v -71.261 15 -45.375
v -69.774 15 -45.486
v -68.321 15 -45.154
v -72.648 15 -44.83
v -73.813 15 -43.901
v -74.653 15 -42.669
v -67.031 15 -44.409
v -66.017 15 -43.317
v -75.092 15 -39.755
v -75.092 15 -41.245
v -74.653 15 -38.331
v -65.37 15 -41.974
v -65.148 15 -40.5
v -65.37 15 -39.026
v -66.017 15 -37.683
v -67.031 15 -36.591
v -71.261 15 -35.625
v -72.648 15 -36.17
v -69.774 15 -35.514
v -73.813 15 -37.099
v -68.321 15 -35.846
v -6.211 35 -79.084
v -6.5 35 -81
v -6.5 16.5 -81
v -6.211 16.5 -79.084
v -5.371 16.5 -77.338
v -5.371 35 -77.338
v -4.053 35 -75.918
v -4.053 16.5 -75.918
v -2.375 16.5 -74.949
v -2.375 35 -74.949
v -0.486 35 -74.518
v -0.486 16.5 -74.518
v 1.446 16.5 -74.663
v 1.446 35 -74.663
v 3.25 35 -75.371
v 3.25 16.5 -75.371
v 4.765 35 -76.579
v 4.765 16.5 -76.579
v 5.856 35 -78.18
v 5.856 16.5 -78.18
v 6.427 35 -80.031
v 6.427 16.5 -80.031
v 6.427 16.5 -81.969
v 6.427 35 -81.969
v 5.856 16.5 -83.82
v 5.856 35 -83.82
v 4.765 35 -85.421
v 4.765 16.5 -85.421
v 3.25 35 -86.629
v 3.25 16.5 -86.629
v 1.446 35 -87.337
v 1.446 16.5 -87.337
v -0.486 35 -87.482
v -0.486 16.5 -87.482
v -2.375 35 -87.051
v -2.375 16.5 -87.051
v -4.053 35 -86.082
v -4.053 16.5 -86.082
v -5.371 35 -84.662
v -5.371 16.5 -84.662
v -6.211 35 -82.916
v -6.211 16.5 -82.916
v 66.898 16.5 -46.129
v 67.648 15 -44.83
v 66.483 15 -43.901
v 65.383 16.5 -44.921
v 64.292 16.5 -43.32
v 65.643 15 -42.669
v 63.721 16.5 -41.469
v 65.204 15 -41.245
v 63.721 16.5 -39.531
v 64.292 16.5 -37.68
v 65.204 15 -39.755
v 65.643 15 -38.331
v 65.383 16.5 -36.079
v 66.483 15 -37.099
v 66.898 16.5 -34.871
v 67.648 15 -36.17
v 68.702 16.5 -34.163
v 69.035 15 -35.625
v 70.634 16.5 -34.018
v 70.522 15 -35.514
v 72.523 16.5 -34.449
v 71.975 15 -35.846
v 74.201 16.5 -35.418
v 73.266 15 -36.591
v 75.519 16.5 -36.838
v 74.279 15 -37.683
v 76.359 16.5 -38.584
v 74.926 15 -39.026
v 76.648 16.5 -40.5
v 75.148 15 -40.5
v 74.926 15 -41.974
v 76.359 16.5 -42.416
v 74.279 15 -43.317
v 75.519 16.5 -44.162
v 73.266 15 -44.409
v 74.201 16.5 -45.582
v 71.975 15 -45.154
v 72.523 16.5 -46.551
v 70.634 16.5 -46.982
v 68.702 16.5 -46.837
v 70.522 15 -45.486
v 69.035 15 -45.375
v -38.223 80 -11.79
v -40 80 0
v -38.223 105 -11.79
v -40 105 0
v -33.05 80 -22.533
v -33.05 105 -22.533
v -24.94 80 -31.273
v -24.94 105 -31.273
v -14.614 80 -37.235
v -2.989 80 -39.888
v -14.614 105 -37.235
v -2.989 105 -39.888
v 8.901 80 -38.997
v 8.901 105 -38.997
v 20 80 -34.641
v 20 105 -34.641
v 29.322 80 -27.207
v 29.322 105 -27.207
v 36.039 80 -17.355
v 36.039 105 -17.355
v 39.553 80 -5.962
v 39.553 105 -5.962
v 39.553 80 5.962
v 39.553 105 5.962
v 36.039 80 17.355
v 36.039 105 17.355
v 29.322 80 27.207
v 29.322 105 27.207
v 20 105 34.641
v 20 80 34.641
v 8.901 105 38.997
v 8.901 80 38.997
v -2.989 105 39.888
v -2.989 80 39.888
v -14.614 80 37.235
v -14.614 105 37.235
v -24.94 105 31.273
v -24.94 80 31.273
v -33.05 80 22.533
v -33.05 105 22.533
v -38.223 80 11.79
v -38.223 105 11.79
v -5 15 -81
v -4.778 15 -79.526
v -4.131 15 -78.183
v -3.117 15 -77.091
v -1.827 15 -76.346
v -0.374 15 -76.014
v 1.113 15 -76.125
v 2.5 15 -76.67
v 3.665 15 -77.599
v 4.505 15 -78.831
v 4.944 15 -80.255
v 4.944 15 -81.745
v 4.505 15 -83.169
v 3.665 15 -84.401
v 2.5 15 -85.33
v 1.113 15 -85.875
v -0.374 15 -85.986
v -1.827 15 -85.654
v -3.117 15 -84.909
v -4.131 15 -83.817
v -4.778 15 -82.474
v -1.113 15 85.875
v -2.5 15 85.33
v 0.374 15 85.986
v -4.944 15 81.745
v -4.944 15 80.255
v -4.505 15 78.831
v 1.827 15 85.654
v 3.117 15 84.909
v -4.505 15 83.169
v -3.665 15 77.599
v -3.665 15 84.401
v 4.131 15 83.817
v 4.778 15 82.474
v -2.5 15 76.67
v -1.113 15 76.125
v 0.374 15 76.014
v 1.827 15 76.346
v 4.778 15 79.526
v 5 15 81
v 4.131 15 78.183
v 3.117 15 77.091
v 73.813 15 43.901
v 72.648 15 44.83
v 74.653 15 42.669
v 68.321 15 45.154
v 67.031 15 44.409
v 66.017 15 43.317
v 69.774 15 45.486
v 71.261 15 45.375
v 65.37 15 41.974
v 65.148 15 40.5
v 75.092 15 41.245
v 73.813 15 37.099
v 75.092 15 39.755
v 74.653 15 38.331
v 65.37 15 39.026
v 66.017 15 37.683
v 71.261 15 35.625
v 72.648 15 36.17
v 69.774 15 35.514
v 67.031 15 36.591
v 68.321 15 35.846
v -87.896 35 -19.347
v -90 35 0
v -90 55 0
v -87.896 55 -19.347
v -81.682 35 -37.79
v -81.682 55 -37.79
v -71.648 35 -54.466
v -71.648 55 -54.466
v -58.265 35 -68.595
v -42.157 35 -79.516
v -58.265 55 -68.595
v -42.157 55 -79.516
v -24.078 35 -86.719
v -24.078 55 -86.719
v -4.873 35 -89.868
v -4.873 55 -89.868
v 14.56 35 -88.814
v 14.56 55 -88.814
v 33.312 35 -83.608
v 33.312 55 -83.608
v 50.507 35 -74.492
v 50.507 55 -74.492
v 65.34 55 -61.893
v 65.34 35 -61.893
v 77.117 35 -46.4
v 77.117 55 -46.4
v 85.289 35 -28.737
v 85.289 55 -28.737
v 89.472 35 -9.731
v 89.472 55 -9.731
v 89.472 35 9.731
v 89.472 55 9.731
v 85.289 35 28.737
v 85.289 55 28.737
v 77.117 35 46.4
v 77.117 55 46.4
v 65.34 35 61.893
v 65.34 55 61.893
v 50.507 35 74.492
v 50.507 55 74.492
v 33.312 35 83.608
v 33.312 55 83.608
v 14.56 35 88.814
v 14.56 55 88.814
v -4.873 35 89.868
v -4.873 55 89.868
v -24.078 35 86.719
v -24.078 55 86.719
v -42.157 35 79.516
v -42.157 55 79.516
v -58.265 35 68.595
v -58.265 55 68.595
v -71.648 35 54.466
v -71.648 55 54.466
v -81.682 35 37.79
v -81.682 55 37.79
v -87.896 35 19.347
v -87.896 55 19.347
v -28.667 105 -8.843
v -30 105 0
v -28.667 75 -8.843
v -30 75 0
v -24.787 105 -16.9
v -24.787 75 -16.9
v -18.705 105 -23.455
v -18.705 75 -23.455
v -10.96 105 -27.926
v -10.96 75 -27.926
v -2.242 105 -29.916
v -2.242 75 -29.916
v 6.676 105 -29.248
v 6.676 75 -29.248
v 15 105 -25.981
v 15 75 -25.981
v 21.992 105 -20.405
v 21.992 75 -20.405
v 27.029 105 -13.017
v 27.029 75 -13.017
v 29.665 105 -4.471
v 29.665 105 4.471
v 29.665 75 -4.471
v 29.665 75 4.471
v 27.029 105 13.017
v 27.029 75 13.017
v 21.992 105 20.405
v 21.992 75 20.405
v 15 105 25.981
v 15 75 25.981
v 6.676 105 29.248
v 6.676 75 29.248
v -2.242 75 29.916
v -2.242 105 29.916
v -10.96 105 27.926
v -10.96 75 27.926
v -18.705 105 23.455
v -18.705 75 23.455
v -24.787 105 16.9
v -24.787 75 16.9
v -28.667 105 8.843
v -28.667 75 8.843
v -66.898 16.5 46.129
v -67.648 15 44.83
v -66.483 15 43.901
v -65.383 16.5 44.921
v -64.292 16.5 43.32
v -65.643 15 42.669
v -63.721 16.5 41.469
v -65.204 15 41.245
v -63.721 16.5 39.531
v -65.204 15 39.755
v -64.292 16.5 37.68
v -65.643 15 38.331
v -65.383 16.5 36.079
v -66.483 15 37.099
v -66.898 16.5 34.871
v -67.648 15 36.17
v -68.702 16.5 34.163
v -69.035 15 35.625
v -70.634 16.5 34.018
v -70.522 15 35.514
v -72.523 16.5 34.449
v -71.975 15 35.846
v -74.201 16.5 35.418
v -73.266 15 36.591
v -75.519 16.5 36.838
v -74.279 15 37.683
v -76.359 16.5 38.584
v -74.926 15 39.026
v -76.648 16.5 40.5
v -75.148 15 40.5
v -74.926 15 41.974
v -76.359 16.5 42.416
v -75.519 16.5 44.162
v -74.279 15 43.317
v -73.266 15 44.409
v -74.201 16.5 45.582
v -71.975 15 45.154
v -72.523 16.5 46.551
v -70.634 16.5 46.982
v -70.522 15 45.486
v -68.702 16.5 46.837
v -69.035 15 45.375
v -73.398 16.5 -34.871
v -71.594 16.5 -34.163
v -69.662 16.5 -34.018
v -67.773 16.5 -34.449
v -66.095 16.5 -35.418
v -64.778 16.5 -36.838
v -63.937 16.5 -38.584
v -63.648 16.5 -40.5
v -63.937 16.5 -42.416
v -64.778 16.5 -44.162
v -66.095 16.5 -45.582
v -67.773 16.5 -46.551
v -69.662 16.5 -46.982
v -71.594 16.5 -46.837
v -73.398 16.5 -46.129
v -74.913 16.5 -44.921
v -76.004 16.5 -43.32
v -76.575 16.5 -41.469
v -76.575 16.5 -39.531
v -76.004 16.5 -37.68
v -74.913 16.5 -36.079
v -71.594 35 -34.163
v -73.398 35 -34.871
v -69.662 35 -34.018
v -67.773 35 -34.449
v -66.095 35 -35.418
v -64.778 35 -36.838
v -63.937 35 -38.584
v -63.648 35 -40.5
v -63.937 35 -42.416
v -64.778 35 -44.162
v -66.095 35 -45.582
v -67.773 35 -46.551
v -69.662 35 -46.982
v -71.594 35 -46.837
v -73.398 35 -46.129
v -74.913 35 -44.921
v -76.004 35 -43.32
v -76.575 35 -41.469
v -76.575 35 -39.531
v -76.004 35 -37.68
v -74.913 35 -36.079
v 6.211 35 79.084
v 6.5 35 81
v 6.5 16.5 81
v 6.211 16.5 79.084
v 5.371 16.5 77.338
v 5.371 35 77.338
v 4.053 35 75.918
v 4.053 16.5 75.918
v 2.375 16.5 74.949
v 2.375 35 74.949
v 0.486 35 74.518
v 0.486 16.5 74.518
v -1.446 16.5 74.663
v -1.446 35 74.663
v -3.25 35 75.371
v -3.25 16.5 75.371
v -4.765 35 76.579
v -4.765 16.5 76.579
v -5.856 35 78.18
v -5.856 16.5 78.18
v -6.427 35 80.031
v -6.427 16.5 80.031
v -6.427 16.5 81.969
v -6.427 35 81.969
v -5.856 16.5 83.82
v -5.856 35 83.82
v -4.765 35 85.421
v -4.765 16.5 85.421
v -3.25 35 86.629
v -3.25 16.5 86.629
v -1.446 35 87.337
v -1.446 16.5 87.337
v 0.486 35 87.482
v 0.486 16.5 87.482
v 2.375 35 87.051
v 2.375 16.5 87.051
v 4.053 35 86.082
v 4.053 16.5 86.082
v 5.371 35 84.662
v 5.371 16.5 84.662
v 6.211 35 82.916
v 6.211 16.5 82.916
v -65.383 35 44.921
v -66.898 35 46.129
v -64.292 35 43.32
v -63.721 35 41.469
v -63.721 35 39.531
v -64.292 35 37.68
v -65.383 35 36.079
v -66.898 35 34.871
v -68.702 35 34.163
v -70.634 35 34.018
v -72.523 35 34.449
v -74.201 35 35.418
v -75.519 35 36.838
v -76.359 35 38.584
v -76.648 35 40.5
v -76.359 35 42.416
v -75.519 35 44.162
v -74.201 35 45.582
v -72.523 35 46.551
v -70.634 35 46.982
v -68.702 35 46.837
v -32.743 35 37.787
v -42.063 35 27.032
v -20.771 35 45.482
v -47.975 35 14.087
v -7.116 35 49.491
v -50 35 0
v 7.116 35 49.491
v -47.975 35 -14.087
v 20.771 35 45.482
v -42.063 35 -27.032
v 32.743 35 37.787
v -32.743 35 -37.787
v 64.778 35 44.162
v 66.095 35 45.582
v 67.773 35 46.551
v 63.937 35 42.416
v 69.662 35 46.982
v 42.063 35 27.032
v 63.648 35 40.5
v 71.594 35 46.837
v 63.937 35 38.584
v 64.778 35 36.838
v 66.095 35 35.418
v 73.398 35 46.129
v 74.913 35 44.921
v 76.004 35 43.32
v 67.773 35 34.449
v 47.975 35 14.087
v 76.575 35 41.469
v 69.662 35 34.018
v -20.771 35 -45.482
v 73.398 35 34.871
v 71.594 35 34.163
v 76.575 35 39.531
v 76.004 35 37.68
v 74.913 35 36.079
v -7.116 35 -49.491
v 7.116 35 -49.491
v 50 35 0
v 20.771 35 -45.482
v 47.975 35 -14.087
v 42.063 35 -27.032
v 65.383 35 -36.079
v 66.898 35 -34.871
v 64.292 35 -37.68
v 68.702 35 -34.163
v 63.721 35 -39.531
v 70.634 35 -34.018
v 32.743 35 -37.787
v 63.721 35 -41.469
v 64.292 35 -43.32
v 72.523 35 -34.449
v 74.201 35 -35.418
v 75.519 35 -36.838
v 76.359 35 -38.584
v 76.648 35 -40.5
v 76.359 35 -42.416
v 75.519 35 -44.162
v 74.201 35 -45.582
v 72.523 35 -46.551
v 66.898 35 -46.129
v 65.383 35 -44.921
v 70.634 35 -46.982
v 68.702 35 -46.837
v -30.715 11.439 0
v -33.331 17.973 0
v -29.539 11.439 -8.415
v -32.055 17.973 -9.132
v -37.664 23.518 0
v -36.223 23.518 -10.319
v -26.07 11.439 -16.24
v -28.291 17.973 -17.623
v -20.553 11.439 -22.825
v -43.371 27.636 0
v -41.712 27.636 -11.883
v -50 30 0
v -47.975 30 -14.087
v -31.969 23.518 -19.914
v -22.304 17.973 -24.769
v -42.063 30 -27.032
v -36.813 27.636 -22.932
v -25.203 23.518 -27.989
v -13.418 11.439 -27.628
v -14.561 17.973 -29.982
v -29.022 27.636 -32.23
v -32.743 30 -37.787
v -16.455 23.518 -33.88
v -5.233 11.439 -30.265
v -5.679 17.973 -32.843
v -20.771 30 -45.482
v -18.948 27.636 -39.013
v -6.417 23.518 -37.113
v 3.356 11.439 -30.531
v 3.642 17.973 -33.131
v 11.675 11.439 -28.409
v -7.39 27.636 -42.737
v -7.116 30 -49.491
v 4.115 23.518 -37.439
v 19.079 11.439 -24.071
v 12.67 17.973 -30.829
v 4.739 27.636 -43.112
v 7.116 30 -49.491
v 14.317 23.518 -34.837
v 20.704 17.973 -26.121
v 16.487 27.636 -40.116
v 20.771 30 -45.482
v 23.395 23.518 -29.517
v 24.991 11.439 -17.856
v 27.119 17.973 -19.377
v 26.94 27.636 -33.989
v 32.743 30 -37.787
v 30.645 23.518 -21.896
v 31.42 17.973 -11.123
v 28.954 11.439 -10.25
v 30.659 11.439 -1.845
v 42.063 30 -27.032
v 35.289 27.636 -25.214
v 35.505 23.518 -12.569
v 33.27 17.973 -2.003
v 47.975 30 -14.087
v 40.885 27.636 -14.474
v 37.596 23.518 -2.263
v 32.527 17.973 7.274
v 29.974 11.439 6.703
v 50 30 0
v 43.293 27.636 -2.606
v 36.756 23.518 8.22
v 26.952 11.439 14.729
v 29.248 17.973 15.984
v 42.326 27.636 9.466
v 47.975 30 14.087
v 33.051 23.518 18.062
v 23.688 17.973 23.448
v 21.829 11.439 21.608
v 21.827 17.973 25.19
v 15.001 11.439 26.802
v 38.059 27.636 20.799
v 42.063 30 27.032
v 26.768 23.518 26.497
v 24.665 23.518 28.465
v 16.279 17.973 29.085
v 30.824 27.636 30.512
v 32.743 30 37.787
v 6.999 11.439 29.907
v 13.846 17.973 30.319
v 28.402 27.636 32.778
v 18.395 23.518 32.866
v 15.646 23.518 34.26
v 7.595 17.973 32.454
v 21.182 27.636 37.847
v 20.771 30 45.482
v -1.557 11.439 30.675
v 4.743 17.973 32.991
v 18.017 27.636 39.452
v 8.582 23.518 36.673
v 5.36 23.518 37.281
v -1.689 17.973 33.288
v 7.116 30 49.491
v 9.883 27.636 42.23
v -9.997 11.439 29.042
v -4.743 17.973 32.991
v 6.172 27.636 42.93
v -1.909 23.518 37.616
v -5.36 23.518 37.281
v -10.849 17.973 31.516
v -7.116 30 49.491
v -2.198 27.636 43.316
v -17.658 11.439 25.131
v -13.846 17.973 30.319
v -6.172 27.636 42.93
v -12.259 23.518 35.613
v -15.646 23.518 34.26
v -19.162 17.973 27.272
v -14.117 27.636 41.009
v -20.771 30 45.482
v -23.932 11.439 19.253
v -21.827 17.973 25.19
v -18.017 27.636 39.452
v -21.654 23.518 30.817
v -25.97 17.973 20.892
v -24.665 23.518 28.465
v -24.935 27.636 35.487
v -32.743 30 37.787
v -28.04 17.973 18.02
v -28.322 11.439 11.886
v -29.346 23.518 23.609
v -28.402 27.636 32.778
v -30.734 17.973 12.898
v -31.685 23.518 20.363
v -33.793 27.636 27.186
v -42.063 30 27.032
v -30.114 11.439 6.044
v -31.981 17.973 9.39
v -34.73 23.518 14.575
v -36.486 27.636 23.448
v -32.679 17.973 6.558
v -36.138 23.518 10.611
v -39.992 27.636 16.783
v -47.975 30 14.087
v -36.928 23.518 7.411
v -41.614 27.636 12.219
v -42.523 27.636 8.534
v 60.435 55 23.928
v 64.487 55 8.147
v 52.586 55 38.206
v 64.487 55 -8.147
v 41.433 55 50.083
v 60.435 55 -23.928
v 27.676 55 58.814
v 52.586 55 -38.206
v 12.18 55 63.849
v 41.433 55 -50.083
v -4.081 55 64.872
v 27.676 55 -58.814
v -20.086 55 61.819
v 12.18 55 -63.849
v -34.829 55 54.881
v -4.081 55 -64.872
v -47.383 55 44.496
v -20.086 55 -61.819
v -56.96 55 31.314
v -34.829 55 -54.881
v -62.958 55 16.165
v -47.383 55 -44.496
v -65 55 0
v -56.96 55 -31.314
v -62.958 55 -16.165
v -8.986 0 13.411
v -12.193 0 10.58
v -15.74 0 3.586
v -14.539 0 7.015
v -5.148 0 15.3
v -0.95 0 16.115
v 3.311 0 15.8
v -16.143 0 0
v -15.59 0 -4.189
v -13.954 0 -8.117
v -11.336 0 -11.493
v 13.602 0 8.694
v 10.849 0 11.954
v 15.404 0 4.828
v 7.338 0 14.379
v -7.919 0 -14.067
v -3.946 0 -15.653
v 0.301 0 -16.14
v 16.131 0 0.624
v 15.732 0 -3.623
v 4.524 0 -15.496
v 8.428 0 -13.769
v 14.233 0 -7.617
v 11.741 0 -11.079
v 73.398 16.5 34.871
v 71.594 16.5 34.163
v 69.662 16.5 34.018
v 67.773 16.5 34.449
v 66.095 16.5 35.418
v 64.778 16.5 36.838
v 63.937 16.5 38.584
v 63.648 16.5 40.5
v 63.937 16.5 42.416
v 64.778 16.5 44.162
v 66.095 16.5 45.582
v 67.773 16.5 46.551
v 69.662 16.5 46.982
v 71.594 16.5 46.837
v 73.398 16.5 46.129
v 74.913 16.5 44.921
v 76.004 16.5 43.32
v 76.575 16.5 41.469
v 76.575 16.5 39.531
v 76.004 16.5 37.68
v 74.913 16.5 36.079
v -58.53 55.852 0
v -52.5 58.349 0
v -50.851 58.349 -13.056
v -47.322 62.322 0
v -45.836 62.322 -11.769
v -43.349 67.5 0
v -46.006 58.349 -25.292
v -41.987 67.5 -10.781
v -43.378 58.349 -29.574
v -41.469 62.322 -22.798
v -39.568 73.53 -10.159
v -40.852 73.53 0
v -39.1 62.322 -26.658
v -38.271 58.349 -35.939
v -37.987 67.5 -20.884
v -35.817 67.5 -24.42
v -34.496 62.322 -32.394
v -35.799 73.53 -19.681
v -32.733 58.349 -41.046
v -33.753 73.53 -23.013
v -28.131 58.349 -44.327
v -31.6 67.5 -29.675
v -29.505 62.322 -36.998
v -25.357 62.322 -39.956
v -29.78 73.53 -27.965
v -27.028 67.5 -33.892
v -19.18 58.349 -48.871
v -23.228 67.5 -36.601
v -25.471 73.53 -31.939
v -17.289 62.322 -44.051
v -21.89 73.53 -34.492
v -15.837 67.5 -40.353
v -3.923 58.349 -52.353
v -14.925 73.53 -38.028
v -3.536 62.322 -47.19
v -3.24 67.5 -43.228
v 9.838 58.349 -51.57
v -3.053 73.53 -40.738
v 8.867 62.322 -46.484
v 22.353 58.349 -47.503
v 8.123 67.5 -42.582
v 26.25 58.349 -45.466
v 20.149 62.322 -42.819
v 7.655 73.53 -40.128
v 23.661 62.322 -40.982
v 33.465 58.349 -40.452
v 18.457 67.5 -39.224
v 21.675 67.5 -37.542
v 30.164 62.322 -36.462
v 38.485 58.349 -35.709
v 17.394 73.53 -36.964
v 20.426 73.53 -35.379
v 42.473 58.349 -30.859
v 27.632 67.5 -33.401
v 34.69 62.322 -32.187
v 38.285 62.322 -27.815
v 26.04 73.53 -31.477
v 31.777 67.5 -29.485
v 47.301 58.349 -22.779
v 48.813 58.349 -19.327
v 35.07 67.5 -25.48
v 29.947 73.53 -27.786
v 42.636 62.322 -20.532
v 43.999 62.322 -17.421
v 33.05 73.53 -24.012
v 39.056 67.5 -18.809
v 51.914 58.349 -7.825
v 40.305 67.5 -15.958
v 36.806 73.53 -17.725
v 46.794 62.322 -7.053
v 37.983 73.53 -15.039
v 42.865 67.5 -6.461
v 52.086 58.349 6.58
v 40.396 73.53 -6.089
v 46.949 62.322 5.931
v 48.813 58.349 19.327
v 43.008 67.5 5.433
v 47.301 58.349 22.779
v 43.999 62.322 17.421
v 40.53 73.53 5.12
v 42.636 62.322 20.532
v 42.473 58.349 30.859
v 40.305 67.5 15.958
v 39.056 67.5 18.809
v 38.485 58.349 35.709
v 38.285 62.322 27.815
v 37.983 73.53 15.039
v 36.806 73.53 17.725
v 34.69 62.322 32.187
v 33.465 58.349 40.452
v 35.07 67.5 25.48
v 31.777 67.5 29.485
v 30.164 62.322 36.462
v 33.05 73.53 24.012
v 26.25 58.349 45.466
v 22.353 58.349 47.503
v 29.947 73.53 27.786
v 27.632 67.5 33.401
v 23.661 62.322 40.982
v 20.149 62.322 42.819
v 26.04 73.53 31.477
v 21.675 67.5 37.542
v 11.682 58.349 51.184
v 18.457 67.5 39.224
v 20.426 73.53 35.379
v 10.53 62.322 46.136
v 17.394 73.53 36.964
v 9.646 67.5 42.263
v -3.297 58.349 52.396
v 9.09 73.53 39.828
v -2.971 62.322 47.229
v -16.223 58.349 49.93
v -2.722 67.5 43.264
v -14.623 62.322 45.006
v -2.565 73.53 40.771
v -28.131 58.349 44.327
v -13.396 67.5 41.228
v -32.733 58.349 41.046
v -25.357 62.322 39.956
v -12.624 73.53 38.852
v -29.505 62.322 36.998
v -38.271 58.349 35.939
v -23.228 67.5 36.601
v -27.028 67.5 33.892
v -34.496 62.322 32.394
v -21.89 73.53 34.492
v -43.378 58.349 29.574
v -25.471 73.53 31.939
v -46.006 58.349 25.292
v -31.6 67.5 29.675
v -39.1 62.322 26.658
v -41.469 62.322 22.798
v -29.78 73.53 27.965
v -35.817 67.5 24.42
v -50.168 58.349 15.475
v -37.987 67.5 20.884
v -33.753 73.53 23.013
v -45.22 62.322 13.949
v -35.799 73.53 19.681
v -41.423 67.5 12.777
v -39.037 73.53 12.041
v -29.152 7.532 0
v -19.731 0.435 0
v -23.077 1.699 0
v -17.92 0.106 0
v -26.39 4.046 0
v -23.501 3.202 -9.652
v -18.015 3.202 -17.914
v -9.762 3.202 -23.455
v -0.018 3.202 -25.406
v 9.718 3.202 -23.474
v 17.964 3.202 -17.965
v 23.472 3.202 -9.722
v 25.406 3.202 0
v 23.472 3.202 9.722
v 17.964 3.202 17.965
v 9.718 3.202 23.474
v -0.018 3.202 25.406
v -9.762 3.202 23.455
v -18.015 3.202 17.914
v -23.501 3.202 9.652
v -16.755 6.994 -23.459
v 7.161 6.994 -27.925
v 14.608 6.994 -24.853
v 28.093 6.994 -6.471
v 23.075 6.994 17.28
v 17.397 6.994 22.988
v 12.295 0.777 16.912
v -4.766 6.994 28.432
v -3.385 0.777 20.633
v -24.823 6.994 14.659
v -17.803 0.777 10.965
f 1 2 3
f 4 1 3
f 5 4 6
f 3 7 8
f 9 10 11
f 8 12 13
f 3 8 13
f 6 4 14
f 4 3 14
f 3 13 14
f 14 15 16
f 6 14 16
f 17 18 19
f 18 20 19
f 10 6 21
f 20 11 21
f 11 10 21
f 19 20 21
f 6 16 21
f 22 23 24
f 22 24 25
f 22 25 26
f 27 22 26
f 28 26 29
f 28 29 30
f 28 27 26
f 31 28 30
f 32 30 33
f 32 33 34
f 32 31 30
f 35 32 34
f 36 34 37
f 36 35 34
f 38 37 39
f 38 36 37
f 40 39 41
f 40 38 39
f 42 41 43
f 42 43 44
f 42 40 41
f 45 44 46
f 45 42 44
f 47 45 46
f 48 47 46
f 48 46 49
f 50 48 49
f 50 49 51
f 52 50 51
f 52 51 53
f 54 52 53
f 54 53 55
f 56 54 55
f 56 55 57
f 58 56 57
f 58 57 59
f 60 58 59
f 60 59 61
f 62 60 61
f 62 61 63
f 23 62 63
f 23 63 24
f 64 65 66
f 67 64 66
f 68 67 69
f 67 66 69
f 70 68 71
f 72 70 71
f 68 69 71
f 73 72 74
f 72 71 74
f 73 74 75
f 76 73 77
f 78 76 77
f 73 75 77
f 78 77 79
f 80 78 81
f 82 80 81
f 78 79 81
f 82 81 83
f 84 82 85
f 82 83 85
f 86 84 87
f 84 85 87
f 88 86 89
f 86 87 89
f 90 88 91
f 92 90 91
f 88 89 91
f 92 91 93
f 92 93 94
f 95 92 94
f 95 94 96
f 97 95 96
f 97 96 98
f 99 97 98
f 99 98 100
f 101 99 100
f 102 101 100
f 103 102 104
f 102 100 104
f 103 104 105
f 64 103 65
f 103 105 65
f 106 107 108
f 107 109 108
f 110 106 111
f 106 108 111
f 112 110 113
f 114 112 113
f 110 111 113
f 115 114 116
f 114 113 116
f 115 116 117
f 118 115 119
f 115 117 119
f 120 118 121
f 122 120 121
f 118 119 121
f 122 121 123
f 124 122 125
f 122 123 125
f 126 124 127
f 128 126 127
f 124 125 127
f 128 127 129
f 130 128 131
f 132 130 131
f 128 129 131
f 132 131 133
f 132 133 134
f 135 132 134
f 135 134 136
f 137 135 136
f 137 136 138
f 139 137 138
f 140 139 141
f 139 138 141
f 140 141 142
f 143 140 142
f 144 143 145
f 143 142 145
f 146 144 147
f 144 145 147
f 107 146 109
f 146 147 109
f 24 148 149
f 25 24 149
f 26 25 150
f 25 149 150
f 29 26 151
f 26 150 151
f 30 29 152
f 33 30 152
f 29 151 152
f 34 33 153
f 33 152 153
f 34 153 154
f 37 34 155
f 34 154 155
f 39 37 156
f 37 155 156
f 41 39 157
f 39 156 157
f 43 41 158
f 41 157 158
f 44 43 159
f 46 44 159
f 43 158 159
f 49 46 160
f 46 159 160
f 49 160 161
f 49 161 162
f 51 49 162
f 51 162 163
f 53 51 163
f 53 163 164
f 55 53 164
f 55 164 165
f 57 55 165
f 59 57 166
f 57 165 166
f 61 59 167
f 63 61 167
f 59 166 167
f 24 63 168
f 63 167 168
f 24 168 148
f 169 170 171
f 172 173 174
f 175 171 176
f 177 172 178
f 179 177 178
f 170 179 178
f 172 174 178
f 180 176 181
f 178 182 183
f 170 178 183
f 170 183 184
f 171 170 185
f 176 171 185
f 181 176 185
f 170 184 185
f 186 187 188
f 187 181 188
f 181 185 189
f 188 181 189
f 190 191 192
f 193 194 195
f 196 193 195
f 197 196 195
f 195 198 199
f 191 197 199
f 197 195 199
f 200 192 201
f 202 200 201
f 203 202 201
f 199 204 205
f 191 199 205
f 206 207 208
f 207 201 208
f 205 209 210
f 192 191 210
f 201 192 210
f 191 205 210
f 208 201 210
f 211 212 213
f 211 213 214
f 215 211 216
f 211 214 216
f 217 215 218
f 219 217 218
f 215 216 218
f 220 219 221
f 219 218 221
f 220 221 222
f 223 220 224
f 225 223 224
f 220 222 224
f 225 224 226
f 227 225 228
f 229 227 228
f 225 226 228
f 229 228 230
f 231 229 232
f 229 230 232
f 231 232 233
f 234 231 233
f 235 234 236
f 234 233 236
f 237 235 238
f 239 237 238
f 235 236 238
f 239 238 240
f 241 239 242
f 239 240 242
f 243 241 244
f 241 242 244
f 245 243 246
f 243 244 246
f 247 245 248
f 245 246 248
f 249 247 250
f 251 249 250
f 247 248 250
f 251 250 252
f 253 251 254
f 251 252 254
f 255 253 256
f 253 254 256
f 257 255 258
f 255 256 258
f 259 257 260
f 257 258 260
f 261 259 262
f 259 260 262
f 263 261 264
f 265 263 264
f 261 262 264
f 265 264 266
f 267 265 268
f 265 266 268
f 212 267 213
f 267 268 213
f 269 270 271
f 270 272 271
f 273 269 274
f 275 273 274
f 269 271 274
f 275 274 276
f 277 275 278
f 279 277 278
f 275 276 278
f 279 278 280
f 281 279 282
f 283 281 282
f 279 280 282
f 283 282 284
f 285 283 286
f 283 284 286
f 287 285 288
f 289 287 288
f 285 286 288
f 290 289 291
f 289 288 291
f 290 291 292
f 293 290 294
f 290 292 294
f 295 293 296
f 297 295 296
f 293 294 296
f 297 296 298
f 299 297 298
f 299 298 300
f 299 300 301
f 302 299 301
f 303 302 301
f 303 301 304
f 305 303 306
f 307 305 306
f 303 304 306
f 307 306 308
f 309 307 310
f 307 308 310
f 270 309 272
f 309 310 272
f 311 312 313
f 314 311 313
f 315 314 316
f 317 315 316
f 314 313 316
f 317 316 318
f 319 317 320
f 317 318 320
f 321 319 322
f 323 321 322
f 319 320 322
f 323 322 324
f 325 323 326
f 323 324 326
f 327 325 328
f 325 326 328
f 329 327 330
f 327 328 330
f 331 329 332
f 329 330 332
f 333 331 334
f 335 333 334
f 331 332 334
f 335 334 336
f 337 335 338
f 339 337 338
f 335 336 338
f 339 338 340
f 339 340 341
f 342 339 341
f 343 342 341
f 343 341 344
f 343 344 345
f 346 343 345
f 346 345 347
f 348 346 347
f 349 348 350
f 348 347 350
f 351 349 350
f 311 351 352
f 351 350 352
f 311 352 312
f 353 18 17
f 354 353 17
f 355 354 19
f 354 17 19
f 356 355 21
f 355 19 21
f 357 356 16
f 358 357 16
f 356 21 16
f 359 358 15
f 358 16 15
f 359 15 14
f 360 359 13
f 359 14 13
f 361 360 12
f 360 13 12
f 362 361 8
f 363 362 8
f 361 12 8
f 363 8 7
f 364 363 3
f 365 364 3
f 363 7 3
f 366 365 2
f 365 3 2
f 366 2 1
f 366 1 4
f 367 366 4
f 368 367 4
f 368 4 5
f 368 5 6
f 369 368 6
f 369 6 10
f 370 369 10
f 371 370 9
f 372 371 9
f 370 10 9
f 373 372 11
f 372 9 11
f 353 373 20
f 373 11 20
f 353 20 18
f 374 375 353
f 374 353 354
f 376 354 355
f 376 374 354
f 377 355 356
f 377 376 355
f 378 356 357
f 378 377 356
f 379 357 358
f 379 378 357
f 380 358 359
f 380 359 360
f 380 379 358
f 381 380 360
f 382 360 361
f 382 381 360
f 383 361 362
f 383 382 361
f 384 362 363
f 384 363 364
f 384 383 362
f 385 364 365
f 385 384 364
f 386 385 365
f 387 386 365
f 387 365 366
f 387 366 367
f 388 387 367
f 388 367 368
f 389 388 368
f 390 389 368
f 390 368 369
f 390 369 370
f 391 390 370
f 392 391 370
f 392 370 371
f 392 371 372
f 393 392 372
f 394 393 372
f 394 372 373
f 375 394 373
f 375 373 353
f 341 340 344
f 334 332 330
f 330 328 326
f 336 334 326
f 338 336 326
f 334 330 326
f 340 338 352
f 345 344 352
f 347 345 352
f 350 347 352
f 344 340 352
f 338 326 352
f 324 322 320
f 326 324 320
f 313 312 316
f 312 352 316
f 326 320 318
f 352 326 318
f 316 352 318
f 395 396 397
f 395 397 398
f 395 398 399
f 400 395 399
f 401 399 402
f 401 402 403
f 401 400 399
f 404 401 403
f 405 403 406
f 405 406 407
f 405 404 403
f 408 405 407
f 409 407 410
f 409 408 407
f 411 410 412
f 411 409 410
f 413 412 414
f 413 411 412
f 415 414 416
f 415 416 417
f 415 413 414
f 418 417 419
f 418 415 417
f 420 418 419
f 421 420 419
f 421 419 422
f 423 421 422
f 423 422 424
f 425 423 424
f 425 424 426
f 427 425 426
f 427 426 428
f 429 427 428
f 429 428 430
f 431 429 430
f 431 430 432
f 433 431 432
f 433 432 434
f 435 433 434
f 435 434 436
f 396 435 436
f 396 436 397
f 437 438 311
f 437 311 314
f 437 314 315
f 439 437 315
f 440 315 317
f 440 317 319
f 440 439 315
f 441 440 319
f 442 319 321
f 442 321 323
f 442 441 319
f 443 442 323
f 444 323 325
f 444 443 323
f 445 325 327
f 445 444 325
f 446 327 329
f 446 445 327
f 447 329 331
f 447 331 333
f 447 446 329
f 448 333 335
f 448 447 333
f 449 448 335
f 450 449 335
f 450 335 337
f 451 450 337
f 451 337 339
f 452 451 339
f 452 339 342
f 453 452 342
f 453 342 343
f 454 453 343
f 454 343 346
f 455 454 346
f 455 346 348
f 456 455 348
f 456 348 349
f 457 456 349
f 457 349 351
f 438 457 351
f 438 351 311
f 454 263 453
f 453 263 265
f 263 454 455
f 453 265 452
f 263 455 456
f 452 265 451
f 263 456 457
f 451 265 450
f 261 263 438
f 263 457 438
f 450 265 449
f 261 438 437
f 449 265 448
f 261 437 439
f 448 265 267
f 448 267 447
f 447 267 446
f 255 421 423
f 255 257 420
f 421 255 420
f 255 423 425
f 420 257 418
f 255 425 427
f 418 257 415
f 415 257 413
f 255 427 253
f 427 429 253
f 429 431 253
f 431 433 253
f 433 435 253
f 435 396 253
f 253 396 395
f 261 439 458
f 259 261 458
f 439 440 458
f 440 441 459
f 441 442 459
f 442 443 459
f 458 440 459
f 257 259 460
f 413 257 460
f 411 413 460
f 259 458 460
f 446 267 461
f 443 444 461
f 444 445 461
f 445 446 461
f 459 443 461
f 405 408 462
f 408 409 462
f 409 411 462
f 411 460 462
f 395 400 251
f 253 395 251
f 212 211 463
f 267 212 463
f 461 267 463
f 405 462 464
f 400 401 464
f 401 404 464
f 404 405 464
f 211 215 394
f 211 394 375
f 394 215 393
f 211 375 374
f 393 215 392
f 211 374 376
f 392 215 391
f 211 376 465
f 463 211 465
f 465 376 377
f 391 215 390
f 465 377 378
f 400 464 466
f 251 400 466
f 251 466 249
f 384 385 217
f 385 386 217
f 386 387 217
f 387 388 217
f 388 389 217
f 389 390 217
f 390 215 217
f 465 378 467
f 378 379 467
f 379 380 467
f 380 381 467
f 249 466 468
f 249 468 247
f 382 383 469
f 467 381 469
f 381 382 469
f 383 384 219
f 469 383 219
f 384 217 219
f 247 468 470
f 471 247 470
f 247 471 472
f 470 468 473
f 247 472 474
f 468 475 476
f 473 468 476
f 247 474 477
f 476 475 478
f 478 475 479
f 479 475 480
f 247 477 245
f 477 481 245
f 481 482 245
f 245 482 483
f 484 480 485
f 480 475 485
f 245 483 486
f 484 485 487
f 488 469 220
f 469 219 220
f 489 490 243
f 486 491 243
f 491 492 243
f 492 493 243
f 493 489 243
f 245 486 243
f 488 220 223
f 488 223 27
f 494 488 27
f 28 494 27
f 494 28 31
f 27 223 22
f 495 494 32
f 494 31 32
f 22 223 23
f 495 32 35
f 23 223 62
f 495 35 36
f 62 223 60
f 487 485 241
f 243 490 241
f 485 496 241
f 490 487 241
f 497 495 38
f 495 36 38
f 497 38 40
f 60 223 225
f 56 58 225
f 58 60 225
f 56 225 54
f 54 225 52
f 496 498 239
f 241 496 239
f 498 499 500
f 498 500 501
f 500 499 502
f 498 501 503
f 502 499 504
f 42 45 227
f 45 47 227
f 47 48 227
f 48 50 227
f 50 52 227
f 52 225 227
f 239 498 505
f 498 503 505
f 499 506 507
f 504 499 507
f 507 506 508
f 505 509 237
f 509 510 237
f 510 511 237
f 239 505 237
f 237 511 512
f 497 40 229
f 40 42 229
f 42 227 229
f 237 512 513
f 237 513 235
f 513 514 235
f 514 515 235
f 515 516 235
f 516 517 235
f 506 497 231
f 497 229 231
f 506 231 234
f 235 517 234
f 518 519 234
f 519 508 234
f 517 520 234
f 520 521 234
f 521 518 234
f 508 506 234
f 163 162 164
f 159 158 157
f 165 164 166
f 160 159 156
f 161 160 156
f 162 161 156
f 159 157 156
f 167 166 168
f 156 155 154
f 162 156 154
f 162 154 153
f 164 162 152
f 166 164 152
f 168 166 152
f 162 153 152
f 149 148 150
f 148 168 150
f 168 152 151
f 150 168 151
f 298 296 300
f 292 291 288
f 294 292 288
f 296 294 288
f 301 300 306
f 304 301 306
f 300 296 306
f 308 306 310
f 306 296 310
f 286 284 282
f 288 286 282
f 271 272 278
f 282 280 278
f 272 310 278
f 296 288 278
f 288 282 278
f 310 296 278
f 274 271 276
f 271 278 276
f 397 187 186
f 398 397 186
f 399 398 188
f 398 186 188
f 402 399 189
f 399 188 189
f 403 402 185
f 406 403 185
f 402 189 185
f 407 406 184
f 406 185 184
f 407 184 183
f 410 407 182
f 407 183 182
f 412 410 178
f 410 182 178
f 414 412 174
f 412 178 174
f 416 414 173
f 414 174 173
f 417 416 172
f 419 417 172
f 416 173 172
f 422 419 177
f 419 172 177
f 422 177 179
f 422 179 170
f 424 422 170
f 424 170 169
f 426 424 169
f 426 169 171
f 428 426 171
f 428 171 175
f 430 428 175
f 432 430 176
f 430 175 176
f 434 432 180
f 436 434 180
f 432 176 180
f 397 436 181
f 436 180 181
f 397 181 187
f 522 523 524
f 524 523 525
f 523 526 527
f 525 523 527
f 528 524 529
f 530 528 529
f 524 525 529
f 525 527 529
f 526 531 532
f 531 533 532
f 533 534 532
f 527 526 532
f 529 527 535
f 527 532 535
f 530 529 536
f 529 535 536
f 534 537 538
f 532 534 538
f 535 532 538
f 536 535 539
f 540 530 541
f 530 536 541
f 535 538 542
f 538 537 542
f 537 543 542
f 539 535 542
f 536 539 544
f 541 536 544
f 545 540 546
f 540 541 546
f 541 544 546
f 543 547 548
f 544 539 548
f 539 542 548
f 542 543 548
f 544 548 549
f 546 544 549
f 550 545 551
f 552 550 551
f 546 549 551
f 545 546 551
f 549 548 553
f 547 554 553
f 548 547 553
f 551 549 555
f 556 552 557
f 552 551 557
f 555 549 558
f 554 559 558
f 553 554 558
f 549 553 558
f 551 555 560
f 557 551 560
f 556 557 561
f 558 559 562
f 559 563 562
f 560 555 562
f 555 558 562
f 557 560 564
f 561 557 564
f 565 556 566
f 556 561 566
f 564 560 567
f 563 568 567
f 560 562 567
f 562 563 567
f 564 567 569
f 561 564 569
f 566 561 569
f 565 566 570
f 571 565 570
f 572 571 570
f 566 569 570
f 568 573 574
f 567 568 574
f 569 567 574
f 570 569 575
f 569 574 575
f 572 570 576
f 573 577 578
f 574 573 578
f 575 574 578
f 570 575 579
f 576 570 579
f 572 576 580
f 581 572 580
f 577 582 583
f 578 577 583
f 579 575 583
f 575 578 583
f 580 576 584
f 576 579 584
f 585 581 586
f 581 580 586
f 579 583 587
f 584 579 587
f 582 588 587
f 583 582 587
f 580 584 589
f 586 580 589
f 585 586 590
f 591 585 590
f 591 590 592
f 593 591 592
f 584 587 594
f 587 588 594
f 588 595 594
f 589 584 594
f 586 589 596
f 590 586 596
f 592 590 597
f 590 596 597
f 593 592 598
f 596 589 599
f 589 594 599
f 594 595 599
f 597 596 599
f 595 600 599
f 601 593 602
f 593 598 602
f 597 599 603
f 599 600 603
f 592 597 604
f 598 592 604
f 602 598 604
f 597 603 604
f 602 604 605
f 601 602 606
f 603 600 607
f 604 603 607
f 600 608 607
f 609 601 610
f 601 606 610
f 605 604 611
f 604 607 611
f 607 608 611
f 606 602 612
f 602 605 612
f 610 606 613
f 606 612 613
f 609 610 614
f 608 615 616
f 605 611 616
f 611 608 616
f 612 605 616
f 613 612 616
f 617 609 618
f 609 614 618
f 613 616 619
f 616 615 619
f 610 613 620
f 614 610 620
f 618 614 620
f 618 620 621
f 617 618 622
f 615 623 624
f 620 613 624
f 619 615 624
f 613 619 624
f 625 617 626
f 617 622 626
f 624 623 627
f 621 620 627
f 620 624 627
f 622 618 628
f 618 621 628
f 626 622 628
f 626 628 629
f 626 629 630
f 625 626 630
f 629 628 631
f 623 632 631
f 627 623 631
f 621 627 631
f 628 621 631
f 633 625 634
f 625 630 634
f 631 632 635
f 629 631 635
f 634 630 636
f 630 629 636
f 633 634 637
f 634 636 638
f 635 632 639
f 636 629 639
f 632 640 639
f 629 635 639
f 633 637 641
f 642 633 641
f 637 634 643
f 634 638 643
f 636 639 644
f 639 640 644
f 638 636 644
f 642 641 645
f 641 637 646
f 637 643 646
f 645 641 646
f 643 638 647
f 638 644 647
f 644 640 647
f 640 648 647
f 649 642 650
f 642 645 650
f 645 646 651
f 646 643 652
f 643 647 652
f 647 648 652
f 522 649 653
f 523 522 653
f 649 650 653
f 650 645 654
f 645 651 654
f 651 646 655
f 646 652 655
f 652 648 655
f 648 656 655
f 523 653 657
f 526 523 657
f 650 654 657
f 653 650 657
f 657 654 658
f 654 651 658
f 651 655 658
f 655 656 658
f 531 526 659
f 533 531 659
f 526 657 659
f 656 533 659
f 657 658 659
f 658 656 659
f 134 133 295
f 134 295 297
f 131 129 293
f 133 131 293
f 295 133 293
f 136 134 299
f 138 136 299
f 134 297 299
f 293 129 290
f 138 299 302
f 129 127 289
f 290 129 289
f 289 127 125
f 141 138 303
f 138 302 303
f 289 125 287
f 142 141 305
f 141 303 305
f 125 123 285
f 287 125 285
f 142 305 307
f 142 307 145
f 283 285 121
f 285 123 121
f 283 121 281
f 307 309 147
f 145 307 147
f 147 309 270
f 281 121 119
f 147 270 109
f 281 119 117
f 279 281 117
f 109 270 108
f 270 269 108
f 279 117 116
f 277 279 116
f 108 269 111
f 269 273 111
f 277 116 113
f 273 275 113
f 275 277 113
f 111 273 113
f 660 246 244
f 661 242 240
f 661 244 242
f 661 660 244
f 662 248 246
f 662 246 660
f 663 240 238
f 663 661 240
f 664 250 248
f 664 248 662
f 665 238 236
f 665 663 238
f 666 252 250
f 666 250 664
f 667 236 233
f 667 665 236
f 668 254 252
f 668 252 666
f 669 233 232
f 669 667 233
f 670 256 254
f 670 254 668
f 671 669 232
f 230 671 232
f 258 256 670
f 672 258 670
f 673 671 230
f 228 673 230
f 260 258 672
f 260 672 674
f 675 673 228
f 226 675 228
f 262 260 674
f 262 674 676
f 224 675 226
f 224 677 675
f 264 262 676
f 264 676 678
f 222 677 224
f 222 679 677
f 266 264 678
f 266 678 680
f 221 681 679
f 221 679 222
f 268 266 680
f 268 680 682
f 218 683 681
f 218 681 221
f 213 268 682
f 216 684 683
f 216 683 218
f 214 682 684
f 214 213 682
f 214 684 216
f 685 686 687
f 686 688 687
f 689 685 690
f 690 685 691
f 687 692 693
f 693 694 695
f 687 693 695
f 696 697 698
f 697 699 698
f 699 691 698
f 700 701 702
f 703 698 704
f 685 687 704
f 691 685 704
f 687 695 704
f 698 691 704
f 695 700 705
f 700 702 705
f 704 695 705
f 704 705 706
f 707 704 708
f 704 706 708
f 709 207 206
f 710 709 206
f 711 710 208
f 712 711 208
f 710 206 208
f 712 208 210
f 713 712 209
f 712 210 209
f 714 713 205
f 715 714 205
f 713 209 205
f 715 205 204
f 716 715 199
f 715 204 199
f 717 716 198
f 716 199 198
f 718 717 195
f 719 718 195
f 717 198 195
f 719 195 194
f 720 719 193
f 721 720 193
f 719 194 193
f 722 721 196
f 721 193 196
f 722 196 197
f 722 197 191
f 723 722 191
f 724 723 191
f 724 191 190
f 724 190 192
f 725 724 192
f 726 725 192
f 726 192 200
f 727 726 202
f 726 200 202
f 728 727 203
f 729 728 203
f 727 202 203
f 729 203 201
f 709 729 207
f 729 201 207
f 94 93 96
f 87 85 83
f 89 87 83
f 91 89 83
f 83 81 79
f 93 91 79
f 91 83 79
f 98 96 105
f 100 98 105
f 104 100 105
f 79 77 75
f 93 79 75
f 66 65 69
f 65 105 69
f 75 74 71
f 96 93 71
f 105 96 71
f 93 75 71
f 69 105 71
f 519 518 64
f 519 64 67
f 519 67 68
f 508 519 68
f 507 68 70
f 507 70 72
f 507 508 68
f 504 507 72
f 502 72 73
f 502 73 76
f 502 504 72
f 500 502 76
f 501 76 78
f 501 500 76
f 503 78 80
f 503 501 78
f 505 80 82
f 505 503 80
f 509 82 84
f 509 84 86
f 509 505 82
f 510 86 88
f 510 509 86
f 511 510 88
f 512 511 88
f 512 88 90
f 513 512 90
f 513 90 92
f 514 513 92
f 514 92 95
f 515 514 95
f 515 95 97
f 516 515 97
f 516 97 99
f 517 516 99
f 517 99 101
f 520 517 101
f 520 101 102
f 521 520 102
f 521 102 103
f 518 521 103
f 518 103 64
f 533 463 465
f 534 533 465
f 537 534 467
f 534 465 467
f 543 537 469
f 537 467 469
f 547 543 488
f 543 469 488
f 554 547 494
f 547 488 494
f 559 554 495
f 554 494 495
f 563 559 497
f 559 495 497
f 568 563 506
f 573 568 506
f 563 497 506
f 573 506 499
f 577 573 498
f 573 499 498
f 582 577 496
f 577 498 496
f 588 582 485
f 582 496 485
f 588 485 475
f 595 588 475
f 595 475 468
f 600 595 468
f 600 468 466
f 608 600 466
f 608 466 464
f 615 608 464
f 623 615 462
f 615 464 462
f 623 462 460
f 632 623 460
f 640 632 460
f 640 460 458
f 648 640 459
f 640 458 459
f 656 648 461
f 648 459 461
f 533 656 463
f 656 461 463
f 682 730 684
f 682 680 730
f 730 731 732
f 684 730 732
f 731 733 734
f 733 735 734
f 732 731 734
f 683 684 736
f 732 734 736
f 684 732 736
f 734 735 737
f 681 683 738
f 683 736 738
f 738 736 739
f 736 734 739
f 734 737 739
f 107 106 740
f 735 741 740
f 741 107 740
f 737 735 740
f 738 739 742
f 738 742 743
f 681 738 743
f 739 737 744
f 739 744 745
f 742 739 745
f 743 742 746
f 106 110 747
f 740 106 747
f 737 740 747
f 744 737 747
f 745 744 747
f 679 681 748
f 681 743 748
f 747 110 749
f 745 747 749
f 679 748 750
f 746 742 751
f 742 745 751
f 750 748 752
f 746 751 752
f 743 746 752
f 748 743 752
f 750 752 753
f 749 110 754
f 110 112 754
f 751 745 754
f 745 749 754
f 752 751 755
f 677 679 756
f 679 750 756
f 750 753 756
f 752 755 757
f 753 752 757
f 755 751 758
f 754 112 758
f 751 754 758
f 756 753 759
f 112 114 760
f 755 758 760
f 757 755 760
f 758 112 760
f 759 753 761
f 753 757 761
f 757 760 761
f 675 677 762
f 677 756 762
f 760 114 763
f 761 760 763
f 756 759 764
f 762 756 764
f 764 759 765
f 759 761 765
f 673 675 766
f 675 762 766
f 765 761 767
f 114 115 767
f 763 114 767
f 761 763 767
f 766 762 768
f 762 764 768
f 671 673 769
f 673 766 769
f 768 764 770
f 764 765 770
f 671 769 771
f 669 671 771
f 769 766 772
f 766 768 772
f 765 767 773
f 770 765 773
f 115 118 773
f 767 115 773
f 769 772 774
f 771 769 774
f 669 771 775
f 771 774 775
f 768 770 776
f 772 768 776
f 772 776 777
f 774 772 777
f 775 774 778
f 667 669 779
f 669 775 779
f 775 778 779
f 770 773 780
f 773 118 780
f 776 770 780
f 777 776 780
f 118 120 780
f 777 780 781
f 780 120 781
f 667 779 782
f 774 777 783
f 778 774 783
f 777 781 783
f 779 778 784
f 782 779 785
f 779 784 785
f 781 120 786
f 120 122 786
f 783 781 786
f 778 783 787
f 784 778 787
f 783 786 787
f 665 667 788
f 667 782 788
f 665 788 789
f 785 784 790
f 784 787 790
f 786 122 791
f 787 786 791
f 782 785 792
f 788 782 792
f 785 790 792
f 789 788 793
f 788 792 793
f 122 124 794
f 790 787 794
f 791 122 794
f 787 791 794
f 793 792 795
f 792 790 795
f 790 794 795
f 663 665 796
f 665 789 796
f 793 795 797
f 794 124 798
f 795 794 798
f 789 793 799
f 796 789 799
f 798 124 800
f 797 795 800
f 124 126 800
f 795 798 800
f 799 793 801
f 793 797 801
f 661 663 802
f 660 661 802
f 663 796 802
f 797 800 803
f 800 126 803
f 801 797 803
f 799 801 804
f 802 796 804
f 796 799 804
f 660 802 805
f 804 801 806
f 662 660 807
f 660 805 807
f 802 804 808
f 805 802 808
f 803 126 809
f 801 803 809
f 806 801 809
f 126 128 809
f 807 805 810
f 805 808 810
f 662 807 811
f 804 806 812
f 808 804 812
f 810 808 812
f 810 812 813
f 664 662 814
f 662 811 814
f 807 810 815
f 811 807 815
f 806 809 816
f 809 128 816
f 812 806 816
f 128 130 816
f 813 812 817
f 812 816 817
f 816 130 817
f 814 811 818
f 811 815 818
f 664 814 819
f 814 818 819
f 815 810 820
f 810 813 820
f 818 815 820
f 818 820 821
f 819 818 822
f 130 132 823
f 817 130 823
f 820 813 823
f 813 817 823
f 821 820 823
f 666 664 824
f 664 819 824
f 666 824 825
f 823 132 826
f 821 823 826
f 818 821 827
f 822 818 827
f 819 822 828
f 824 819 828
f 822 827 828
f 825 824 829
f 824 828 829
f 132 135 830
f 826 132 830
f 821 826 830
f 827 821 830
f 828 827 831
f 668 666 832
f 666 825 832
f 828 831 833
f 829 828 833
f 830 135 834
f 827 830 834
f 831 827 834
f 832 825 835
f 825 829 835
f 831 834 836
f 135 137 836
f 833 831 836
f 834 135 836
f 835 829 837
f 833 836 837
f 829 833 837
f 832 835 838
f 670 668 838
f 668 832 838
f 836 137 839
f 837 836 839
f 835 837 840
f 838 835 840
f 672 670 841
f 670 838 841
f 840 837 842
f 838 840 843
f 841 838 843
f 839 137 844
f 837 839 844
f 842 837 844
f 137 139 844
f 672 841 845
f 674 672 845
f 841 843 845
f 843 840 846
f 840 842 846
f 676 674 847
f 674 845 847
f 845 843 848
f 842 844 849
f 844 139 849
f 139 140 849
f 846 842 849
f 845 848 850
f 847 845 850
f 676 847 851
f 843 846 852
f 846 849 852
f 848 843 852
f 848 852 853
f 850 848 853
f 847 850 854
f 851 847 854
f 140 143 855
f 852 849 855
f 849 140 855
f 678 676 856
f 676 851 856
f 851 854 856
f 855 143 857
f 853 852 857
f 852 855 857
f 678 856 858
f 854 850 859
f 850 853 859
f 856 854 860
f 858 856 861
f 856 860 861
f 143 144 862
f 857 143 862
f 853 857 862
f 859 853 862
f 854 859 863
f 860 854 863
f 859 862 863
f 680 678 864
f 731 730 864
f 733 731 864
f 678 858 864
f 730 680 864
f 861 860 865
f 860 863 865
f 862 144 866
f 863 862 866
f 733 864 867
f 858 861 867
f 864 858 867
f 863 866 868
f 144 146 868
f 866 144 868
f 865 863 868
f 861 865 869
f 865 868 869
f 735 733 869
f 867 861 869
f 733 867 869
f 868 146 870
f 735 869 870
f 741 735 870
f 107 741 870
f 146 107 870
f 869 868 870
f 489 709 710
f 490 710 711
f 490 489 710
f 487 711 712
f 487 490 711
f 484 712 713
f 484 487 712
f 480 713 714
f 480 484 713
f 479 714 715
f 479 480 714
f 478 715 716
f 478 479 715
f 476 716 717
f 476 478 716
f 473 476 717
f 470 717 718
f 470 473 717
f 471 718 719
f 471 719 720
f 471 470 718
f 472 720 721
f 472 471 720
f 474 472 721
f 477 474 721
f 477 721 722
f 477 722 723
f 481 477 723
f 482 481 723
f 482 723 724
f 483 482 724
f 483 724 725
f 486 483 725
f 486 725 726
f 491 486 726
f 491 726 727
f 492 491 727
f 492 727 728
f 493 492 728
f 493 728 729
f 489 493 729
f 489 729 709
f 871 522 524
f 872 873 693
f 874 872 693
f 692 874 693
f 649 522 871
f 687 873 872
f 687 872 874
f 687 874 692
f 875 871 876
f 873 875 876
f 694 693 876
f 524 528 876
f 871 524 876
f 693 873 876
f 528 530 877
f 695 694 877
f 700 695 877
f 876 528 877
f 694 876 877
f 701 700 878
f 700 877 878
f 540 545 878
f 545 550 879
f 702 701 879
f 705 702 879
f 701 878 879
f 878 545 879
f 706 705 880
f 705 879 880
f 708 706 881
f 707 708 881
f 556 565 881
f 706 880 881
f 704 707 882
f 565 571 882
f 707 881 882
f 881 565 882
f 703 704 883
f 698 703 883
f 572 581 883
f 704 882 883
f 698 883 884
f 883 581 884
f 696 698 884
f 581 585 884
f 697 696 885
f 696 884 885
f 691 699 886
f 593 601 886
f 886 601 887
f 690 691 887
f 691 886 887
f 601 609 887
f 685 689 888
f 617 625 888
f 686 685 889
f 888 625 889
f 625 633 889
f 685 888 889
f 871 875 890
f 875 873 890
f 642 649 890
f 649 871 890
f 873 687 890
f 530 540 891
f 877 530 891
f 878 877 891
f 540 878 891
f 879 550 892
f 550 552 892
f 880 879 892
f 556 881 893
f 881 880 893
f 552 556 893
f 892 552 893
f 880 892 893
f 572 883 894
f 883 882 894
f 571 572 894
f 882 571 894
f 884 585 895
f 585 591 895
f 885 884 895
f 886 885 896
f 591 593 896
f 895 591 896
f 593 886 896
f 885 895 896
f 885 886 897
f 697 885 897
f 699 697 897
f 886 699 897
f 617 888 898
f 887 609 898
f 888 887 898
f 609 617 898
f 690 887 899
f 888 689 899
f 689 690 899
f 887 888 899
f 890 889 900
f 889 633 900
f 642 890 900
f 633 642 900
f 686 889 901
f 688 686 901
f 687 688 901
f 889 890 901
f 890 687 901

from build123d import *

# Parameters (mm, degrees)
SKETCH2_R           = 6.5000000000000036
BOSS_EXTRUDE2_DEPTH = 40
CIRPATTERN15_COUNT  = 6
CHAMFER1_SIZE       = 1.5
FILLET1_R           = 25
FILLET2_R           = 15


with BuildPart() as part:
    # Sketch1 → Revolve1 (revolve)
    with BuildSketch(Plane.XY):
        Polygon((2.8e-16, 75), (0, 0), (-30, 0), (-30, 29.999999999999996), (-50.00000000000002, 29.999999999999993), (-50.00000000000002, 34.99999999999999), (-90.00000000000003, 34.99999999999999), (-90.00000000000003, 54.99999999999999), (-40.000000000000014, 54.99999999999999), (-40, 105), (-30.000000000000004, 105), (-30, 75), align=None)
    revolve(axis=Axis((2.8e-16, 75, 0), (0, -1, 0)))

    # Sketch2 → Boss-Extrude2 (add)
    with BuildSketch(Plane(origin=(2.1e-16, 54.99999999999999, 0), x_dir=(1, 0, 0), z_dir=(0, 1, 0))):
        with Locations(Location((0, 81, 0), (0, 0, 180))):
            Circle(SKETCH2_R)
    boss_extrude2 = extrude(amount=-BOSS_EXTRUDE2_DEPTH)

    # CirPattern15: Boss-Extrude2 ×6 about axis
    cirpattern15_axis = Axis((9.552e-14, 0, 1.87e-15), (0, 1, 0))
    for i in range(1, CIRPATTERN15_COUNT):
        add(boss_extrude2.rotate(cirpattern15_axis, i * 360 / CIRPATTERN15_COUNT))

    # Chamfer1
    chamfer1_edges = [part.edges().sort_by_distance(p)[0] for p in [
        (6.5000000000000036, 14.999999999999993, -81),
        (73.39805770653957, 14.999999999999993, -34.870834875401236),
        (66.89805770653965, 14.999999999999993, 46.129165124598806),
        (-6.499999999999822, 14.999999999999993, 81),
        (-73.39805770653939, 14.999999999999993, 34.87083487540121),
        (-66.89805770653949, 14.999999999999993, -46.12916512459878),
    ]]
    chamfer(chamfer1_edges, length=CHAMFER1_SIZE)

    # Fillet1
    # the kernel refuses this fillet: 25 mm, written as the material it adds along each edge
    with BuildSketch(Plane(origin=(1.1e-16, 30, 0), x_dir=(-1, 0, 0), z_dir=(0, 0, 1))) as fillet1_piece_1:
        with BuildLine():
            CenterArc((55, 24.494897427831788), FILLET1_R, 180, 78.46304096718455)
            Line((30, 24.494897427831788), (29.5, 24.494897427831788))
            Line((29.5, 24.494897427831788), (29.5, 0))
            Line((29.5, 0), (30, -0.5))
            ThreePointArc((30, -0.5), (40.000000000000014, -0.5), (49.90000000000002, -0.4898979485566315))
            Line((49.90000000000002, -0.4898979485566315), (50.00000000000002, 3.55e-15))
        make_face()
    revolve(axis=Axis((1.1e-16, 30, 0), (0, -1, 0)))
    with BuildSketch(Plane(origin=(2.1e-16, 54.99999999999999, 0), x_dir=(-1, 0, 0), z_dir=(0, 0, 1))) as fillet1_piece_2:
        with BuildLine():
            CenterArc((40.000000000000014 + FILLET1_R, -FILLET1_R), FILLET1_R, 90, 89.99999999999997)
            Line((40.000000000000014, -FILLET1_R), (40.000000000000014 - FILLET1_R * 0.02, -FILLET1_R))
            Line((40.000000000000014 - FILLET1_R * 0.02, -FILLET1_R), (40.000000000000014 - FILLET1_R * 0.02, FILLET1_R * 0.02))
            Line((40.000000000000014 - FILLET1_R * 0.02, FILLET1_R * 0.02), (40.000000000000014 + FILLET1_R, FILLET1_R * 0.02))
            Line((40.000000000000014 + FILLET1_R, FILLET1_R * 0.02), (40.000000000000014 + FILLET1_R, -7.11e-15))
        make_face()
    revolve(axis=Axis((2.1e-16, 54.99999999999999, 0), (0, -1, 0)))

    # Fillet2
    fillet2_edges = [part.edges().sort_by_distance(p)[0] for p in [
        (30, -1.1e-16, -1.7e-14),
    ]]
    fillet(fillet2_edges, radius=FILLET2_R)


solid = part.part
